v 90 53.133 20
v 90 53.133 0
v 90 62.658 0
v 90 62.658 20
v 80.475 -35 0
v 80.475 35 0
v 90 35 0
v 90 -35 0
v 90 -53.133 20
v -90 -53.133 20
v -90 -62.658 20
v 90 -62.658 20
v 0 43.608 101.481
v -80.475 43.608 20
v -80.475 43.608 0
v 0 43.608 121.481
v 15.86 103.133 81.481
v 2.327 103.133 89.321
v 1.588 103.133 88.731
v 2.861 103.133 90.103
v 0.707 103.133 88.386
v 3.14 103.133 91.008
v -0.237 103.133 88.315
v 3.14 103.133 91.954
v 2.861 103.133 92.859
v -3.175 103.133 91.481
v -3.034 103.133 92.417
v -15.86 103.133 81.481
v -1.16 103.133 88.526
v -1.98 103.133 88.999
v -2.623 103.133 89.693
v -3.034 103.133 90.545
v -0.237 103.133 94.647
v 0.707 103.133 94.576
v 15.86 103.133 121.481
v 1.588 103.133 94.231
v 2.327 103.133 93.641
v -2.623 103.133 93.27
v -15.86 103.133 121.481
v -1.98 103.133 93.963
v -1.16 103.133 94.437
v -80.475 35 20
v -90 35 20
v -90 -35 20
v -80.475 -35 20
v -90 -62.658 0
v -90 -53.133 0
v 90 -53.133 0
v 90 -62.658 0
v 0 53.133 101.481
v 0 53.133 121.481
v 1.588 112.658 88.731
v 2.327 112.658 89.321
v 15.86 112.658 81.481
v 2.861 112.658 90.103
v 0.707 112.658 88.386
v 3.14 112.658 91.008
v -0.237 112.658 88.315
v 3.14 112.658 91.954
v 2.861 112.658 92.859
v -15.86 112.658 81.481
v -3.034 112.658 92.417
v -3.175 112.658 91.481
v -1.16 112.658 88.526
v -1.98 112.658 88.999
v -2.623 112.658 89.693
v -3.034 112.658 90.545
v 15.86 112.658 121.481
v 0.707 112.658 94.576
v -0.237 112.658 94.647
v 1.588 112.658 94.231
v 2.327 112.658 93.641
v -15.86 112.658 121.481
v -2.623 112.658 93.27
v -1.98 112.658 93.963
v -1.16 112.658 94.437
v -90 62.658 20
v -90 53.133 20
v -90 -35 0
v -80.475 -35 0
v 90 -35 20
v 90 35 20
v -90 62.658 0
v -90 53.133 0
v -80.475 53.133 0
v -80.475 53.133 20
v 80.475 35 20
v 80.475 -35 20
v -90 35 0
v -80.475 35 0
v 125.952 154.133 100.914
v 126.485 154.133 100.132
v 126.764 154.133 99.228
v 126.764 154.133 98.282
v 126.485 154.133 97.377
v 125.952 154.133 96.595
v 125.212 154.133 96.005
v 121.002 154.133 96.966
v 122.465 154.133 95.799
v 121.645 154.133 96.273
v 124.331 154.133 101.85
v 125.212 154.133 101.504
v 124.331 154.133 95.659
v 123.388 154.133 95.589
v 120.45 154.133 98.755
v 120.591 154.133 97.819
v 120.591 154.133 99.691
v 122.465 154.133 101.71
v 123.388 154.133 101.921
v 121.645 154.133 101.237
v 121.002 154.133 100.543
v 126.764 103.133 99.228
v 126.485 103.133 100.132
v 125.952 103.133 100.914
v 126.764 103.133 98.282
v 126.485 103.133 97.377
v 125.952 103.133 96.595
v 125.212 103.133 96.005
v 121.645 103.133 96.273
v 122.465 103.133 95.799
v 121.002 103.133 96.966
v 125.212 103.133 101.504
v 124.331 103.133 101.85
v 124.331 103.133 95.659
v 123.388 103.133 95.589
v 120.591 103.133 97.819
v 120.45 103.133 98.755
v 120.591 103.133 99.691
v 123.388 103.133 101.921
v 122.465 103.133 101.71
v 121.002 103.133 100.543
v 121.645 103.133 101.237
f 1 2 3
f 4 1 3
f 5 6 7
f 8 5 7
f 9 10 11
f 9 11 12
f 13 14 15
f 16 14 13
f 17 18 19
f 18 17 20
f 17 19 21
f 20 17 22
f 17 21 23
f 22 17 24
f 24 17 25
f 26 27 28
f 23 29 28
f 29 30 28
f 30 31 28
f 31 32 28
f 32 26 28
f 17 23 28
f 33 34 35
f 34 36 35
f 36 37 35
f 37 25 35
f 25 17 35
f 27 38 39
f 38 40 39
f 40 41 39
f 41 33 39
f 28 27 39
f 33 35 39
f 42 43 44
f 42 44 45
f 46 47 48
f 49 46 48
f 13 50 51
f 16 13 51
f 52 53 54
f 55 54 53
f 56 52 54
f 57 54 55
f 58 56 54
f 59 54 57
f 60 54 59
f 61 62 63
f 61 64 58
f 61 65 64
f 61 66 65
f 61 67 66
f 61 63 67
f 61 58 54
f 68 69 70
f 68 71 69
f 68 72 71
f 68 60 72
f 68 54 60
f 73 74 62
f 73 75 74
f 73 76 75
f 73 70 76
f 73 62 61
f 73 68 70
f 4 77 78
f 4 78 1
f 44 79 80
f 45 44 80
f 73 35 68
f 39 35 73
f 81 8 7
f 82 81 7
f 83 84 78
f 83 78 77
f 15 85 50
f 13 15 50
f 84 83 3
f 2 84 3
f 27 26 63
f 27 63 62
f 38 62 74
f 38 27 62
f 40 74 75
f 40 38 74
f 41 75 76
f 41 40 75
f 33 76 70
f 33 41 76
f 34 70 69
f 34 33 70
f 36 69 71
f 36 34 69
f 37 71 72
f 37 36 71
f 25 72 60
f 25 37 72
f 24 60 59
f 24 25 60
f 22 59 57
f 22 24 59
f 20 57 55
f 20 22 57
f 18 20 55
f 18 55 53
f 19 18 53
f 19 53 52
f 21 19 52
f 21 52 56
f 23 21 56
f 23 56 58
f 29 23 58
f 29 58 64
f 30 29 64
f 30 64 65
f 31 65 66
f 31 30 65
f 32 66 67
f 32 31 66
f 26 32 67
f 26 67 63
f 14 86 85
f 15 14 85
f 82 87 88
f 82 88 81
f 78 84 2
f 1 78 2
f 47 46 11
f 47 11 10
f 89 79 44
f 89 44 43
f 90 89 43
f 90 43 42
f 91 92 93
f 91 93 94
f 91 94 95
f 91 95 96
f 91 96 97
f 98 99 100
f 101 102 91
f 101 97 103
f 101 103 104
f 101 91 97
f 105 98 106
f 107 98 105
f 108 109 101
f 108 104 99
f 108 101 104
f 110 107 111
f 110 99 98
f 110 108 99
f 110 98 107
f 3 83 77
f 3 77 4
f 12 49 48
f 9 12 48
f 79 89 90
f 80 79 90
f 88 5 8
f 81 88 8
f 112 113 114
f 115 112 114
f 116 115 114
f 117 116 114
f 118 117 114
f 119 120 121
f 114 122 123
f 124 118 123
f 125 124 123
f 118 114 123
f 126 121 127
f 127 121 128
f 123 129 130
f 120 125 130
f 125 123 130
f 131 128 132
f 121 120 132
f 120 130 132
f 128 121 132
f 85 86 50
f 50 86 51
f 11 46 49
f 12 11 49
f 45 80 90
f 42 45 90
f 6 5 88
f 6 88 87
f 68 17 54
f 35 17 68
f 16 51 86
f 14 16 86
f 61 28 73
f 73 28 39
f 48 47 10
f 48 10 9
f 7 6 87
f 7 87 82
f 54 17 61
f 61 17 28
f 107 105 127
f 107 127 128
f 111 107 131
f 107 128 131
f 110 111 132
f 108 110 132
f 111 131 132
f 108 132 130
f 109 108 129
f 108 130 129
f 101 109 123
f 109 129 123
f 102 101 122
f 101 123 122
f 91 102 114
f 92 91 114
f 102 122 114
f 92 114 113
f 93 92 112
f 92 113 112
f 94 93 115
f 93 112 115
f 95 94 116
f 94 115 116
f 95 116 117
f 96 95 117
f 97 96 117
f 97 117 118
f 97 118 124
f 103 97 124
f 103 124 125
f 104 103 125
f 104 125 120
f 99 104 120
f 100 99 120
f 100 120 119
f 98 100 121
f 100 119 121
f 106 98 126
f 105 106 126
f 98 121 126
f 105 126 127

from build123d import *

# Parameters (mm, degrees)
F1_W     = 180
F1_H     = 9.525
F2_DEPTH = 20
F1_W_2   = 9.525
F1_H_2   = 70
F4_DEPTH = 9.525
F6_W     = 31.7202090866
F6_H     = 40
F6_R     = 3.175
F7_DEPTH = 9.525
F8_R     = 3.175
F9_DEPTH = 51


with BuildPart() as f2:
    # F1 (on Top) → F2 (new body)
    with BuildSketch(Plane.XY):
        with Locations((0, 57.8950265765)):
            Rectangle(F1_W, F1_H)
    extrude(amount=F2_DEPTH)


with BuildPart() as f2b:
    # F1 (on Top) → F2, piece 2 (new body)
    with BuildSketch(Plane.XY):
        with Locations((-85.2375, 0)):
            Rectangle(F1_W_2, F1_H_2)
    extrude(amount=F2_DEPTH)


with BuildPart() as f2c:
    # F1 (on Top) → F2, piece 3 (new body)
    with BuildSketch(Plane.XY):
        with Locations((0, -57.8950265765)):
            Rectangle(F1_W, F1_H)
    extrude(amount=F2_DEPTH)


with BuildPart() as f2d:
    # F1 (on Top) → F2, piece 4 (new body)
    with BuildSketch(Plane.XY):
        with Locations((85.2375, 0)):
            Rectangle(F1_W_2, F1_H_2)
    extrude(amount=F2_DEPTH)


with BuildPart() as f4:
    # F3 (on face) → F4 (new body)
    with BuildSketch(Plane.XZ.offset(-53.1325265765)):
        Polygon((0, 121.4810460806), (-80.475, 20), (-80.475, 0), (0, 101.4810460806), align=None)
    extrude(amount=F4_DEPTH)


with BuildPart() as f7:
    # F6 (on offset) → F7 (new body)
    with BuildSketch(Plane(origin=(0, 103.1325265765, 0), x_dir=(-1, 0, 0), z_dir=(0, 1, 0))):
        with Locations((0, 101.4810460806)):
            Rectangle(F6_W, F6_H)
        with Locations((0, 91.4810460806)):
            Circle(F6_R, mode=Mode.SUBTRACT)
    extrude(amount=F7_DEPTH)


with BuildPart() as f9:
    # F8 (on offset) → F9 (new body)
    with BuildSketch(Plane(origin=(0, 103.1325265765, 0), x_dir=(-1, 0, 0), z_dir=(0, 1, 0))):
        with Locations((-123.6248090863, 98.7548306584)):
            Circle(F8_R)
    extrude(amount=F9_DEPTH)


with BuildPart() as f10_1:
    # F10: instance of F4
    add(f4.part.mirror(Plane(origin=(0, 48.3700265765, 111.4810460806), x_dir=(0, 1, 0), z_dir=(1, 0, 0))))


solid = Compound([f2.part, f2b.part, f2c.part, f2d.part, f4.part, f7.part, f9.part])
